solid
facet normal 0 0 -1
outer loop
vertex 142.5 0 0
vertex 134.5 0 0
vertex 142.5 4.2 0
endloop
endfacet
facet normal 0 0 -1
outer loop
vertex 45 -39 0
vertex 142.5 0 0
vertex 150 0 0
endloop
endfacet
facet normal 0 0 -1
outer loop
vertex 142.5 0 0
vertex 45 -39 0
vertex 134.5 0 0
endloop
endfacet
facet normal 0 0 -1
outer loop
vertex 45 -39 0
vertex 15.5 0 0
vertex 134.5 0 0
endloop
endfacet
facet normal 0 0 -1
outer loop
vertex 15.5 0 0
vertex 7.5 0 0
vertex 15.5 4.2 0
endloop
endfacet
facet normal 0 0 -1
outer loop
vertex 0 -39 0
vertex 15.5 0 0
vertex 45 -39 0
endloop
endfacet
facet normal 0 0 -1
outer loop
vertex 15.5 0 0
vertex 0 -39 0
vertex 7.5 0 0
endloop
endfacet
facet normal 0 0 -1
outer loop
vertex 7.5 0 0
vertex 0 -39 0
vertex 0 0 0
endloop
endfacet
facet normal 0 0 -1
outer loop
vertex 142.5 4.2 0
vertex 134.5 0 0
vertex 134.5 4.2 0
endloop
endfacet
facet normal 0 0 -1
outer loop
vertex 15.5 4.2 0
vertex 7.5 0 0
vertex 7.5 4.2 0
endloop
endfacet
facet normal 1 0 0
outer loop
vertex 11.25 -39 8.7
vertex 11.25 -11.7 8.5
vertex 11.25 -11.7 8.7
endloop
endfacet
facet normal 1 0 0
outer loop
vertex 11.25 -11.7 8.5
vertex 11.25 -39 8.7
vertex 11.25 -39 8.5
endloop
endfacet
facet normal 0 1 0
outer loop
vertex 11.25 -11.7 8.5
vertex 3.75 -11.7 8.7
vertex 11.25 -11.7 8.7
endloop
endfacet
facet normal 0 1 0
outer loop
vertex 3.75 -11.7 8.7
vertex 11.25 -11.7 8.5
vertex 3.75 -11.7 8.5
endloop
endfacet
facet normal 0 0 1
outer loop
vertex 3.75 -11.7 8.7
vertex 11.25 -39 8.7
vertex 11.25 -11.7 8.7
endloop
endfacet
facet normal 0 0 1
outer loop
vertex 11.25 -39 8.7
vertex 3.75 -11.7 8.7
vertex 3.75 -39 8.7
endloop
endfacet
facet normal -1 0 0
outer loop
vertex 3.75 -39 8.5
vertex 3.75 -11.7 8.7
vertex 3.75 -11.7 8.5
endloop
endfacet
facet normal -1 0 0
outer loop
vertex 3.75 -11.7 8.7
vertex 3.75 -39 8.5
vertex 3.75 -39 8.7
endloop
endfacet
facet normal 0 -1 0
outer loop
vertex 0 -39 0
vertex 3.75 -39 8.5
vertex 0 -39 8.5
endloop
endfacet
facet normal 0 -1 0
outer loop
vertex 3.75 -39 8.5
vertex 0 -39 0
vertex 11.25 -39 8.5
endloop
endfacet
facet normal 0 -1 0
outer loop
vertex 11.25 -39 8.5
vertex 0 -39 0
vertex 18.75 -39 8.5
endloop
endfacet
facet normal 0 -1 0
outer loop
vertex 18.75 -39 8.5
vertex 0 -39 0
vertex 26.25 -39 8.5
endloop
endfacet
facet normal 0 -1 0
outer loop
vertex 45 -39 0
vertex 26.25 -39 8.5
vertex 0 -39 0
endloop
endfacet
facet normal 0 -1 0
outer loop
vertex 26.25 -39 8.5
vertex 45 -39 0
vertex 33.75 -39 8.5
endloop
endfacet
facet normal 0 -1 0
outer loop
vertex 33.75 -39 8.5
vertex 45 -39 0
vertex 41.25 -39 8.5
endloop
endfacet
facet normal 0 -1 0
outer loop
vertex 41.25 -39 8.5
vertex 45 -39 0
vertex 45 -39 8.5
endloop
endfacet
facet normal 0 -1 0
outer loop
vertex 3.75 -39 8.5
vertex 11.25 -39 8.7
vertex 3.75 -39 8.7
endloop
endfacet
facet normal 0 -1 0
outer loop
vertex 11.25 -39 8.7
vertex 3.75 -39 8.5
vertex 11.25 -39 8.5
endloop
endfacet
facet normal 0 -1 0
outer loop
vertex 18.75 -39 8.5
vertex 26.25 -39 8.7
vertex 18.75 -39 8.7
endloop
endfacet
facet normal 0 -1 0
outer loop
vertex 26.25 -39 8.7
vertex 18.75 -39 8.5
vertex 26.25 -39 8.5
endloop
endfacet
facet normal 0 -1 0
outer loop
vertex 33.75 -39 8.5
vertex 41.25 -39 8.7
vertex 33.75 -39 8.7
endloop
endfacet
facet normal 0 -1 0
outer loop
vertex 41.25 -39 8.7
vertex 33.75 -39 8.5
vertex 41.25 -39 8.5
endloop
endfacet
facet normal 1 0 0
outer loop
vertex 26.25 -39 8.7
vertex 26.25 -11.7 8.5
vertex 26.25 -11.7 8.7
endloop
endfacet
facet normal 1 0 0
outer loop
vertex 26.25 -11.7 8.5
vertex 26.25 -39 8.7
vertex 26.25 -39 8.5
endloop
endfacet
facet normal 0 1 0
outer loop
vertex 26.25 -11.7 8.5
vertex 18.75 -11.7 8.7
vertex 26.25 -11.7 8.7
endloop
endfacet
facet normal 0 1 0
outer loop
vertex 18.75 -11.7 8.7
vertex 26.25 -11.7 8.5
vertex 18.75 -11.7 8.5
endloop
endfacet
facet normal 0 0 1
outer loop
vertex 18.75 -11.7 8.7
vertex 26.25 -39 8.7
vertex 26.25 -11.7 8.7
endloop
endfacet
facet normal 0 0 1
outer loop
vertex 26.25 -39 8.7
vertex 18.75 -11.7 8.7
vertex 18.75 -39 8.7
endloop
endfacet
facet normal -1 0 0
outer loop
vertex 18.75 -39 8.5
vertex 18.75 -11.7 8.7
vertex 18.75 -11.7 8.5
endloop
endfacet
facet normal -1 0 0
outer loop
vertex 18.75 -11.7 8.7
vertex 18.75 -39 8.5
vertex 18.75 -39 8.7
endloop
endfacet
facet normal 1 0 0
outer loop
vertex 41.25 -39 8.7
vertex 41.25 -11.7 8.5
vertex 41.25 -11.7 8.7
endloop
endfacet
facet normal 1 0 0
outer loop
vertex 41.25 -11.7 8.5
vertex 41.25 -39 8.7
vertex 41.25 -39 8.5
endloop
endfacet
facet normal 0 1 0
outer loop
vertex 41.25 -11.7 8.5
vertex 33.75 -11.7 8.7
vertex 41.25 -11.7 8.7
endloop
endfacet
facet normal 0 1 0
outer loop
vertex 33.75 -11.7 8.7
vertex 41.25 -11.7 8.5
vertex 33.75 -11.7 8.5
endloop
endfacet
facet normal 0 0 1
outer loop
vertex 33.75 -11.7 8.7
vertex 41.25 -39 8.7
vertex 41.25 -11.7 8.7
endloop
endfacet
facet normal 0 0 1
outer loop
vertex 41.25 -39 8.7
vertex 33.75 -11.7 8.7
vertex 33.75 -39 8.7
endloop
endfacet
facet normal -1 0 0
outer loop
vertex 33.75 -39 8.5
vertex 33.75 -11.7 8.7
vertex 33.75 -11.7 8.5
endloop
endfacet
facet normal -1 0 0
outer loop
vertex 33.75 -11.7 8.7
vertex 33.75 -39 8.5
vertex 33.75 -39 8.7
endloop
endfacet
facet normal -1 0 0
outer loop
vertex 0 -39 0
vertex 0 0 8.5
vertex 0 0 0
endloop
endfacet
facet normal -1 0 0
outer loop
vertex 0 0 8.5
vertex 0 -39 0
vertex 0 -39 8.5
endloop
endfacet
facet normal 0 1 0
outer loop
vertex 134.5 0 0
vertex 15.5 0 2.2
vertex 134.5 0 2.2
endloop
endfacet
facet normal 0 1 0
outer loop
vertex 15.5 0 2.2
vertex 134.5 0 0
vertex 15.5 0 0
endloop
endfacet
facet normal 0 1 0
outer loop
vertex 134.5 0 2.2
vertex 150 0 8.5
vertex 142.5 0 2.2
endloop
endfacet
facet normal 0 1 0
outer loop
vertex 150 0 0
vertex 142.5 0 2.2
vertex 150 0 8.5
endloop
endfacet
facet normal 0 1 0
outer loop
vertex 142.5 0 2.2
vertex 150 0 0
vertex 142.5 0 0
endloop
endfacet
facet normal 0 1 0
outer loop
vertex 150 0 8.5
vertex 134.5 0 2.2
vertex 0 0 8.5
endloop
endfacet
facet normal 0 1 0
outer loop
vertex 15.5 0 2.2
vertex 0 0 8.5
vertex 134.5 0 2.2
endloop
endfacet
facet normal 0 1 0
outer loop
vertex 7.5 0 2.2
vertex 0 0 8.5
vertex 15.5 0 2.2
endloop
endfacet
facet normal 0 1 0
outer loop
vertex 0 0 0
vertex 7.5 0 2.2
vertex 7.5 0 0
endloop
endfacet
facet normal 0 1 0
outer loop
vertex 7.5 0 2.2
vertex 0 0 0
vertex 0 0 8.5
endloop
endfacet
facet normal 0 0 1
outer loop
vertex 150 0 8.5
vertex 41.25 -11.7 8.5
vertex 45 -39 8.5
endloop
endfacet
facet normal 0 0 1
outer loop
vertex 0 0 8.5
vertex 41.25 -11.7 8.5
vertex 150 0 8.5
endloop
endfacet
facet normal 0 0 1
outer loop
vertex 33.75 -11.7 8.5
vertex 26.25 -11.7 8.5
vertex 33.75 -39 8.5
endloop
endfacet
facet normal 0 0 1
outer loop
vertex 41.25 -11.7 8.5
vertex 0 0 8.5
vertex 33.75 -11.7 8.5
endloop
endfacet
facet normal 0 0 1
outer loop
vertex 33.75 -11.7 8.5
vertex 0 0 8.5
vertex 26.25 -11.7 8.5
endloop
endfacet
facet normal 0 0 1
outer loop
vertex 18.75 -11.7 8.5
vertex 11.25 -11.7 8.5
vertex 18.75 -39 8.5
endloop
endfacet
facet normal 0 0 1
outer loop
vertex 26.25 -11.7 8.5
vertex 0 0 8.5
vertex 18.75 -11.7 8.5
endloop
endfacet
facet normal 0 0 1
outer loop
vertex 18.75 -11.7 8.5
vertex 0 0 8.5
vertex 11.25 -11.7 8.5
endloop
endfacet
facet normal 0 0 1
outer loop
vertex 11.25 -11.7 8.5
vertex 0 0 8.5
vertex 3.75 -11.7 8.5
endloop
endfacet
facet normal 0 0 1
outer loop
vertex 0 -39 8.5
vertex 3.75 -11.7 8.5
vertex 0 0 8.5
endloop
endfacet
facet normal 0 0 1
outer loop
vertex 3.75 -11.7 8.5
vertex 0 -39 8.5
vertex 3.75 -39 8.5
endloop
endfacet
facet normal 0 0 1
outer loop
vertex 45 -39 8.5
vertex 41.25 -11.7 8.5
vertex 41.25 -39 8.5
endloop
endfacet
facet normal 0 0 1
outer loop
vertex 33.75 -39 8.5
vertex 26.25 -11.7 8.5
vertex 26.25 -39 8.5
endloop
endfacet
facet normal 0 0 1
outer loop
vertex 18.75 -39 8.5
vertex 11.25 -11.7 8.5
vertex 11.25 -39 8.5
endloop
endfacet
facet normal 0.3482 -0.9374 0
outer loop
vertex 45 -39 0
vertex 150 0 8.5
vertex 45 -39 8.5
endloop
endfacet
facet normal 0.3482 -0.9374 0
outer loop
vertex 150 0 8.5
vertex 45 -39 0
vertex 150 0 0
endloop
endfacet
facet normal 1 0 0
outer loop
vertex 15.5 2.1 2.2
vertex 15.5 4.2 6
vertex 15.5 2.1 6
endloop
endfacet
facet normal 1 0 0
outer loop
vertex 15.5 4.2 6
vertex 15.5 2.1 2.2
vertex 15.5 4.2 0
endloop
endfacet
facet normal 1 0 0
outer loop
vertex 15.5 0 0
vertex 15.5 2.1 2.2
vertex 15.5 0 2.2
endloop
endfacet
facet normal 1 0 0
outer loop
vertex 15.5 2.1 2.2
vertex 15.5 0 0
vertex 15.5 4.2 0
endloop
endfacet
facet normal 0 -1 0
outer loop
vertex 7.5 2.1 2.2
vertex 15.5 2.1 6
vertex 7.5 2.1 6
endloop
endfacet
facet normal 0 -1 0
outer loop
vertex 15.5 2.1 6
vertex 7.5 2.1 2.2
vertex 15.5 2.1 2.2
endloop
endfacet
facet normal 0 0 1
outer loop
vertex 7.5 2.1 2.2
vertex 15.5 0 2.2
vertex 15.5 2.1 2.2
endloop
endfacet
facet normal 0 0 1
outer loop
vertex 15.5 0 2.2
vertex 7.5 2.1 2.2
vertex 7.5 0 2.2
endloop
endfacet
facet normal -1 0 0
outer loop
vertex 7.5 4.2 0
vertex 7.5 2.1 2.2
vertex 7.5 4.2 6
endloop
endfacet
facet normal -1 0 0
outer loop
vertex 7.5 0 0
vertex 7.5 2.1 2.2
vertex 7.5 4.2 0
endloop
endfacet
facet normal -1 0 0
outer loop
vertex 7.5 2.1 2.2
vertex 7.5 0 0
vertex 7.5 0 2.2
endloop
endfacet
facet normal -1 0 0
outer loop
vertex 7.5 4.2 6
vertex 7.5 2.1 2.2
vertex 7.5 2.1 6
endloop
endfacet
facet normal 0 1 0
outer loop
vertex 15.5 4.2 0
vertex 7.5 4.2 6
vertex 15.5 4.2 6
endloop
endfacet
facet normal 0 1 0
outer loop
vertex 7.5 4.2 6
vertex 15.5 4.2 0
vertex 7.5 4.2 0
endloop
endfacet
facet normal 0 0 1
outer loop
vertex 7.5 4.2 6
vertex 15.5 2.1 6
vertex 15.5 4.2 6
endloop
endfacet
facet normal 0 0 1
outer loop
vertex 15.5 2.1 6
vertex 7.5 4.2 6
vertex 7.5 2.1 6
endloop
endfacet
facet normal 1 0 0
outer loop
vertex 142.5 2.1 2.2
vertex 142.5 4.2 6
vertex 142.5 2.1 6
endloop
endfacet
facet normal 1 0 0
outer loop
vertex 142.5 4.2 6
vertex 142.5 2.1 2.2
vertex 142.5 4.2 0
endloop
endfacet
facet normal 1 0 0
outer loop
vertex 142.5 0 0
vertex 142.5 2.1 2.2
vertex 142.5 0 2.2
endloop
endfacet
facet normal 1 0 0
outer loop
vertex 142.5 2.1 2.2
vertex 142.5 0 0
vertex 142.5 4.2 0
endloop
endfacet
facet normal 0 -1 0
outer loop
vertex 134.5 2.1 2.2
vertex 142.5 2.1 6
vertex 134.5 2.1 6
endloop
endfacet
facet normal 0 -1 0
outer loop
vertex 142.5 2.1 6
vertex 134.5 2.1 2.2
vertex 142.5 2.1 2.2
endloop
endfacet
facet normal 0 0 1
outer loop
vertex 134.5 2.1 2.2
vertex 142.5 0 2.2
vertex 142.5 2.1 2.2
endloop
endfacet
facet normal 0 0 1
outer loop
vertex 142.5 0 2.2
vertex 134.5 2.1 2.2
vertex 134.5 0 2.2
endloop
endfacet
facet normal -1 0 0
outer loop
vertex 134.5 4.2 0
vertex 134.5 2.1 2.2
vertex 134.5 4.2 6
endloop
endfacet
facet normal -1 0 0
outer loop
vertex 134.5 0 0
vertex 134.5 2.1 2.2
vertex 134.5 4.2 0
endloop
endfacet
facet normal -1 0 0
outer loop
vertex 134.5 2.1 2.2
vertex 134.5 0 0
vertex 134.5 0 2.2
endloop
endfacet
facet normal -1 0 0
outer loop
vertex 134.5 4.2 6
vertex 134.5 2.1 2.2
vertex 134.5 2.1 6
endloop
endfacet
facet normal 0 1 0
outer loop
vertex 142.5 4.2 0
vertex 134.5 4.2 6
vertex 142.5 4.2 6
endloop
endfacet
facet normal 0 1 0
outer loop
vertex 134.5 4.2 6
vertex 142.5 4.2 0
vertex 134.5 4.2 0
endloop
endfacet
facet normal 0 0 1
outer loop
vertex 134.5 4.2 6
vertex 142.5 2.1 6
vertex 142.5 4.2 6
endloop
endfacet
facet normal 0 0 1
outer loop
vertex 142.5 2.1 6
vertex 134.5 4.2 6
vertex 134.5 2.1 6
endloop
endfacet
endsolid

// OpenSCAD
// file: curve-start-right.scad
// kerb

kerb_length = 150; // mm
kerb_width = 39; // mm
kerb_height = 8.5; // mm
kerb_angle = 0.3; // %

linear_extrude(kerb_height) polygon([
    [0, 0], 
    [kerb_length, 0], 
    [kerb_length * kerb_angle, kerb_width], 
    [0, kerb_width]
]);

// hooks

hook_width = 8; // mm
hook_bend_height = 2.2; // mm
hook_bend_length = 2.1; // mm
hook_barb_height = 6; // mm
hook_barb_length = 1; // mm

linear_extrude(hook_bend_height) polygon([
    [0.05*kerb_length, 0], 
    [0.05*kerb_length + hook_width, 0], 
    [0.05*kerb_length + hook_width, -hook_bend_length], 
    [0.05*kerb_length, -hook_bend_length]
]);


linear_extrude(hook_barb_height) polygon([
    [0.05*kerb_length, -hook_bend_length], 
    [0.05*kerb_length + hook_width, -hook_bend_length], 
    [0.05*kerb_length + hook_width, -hook_bend_length-hook_bend_length], 
    [0.05*kerb_length, -hook_bend_length-hook_bend_length]
]);

linear_extrude(hook_bend_height) polygon([
    [0.95*kerb_length - hook_width, 0], 
    [0.95*kerb_length, 0], 
    [0.95*kerb_length, -hook_bend_length], 
    [0.95*kerb_length - hook_width, -hook_bend_length]
]);


linear_extrude(hook_barb_height) polygon([
    [0.95*kerb_length - hook_width, -hook_bend_length], 
    [0.95*kerb_length, -hook_bend_length], 
    [0.95*kerb_length, -hook_bend_length-hook_bend_length], 
    [0.95*kerb_length - hook_width, -hook_bend_length-hook_bend_length]
]);

// strips

strip_count = 3; // #
strip_width = 0.5; // %
strip_length = 0.7; // %
strip_height = 0.2; // mm

for(i = [0 : strip_count - 1]) {
    strip_size = strip_width * kerb_length * kerb_angle / strip_count;
    strip_offset = i * kerb_length * kerb_angle / strip_count + (1-strip_width) * kerb_length * kerb_angle / (2 * strip_count);

    linear_extrude(kerb_height + strip_height) polygon([
        [strip_offset, kerb_width],
        [strip_offset + strip_size, kerb_width],
        [strip_offset + strip_size, (1-strip_length) * kerb_width],
        [strip_offset, (1-strip_length) * kerb_width]
    ]);
}
// main file
mirror(v= [0, 1, 0] ) {
    include <curve-start-right.scad>
}
